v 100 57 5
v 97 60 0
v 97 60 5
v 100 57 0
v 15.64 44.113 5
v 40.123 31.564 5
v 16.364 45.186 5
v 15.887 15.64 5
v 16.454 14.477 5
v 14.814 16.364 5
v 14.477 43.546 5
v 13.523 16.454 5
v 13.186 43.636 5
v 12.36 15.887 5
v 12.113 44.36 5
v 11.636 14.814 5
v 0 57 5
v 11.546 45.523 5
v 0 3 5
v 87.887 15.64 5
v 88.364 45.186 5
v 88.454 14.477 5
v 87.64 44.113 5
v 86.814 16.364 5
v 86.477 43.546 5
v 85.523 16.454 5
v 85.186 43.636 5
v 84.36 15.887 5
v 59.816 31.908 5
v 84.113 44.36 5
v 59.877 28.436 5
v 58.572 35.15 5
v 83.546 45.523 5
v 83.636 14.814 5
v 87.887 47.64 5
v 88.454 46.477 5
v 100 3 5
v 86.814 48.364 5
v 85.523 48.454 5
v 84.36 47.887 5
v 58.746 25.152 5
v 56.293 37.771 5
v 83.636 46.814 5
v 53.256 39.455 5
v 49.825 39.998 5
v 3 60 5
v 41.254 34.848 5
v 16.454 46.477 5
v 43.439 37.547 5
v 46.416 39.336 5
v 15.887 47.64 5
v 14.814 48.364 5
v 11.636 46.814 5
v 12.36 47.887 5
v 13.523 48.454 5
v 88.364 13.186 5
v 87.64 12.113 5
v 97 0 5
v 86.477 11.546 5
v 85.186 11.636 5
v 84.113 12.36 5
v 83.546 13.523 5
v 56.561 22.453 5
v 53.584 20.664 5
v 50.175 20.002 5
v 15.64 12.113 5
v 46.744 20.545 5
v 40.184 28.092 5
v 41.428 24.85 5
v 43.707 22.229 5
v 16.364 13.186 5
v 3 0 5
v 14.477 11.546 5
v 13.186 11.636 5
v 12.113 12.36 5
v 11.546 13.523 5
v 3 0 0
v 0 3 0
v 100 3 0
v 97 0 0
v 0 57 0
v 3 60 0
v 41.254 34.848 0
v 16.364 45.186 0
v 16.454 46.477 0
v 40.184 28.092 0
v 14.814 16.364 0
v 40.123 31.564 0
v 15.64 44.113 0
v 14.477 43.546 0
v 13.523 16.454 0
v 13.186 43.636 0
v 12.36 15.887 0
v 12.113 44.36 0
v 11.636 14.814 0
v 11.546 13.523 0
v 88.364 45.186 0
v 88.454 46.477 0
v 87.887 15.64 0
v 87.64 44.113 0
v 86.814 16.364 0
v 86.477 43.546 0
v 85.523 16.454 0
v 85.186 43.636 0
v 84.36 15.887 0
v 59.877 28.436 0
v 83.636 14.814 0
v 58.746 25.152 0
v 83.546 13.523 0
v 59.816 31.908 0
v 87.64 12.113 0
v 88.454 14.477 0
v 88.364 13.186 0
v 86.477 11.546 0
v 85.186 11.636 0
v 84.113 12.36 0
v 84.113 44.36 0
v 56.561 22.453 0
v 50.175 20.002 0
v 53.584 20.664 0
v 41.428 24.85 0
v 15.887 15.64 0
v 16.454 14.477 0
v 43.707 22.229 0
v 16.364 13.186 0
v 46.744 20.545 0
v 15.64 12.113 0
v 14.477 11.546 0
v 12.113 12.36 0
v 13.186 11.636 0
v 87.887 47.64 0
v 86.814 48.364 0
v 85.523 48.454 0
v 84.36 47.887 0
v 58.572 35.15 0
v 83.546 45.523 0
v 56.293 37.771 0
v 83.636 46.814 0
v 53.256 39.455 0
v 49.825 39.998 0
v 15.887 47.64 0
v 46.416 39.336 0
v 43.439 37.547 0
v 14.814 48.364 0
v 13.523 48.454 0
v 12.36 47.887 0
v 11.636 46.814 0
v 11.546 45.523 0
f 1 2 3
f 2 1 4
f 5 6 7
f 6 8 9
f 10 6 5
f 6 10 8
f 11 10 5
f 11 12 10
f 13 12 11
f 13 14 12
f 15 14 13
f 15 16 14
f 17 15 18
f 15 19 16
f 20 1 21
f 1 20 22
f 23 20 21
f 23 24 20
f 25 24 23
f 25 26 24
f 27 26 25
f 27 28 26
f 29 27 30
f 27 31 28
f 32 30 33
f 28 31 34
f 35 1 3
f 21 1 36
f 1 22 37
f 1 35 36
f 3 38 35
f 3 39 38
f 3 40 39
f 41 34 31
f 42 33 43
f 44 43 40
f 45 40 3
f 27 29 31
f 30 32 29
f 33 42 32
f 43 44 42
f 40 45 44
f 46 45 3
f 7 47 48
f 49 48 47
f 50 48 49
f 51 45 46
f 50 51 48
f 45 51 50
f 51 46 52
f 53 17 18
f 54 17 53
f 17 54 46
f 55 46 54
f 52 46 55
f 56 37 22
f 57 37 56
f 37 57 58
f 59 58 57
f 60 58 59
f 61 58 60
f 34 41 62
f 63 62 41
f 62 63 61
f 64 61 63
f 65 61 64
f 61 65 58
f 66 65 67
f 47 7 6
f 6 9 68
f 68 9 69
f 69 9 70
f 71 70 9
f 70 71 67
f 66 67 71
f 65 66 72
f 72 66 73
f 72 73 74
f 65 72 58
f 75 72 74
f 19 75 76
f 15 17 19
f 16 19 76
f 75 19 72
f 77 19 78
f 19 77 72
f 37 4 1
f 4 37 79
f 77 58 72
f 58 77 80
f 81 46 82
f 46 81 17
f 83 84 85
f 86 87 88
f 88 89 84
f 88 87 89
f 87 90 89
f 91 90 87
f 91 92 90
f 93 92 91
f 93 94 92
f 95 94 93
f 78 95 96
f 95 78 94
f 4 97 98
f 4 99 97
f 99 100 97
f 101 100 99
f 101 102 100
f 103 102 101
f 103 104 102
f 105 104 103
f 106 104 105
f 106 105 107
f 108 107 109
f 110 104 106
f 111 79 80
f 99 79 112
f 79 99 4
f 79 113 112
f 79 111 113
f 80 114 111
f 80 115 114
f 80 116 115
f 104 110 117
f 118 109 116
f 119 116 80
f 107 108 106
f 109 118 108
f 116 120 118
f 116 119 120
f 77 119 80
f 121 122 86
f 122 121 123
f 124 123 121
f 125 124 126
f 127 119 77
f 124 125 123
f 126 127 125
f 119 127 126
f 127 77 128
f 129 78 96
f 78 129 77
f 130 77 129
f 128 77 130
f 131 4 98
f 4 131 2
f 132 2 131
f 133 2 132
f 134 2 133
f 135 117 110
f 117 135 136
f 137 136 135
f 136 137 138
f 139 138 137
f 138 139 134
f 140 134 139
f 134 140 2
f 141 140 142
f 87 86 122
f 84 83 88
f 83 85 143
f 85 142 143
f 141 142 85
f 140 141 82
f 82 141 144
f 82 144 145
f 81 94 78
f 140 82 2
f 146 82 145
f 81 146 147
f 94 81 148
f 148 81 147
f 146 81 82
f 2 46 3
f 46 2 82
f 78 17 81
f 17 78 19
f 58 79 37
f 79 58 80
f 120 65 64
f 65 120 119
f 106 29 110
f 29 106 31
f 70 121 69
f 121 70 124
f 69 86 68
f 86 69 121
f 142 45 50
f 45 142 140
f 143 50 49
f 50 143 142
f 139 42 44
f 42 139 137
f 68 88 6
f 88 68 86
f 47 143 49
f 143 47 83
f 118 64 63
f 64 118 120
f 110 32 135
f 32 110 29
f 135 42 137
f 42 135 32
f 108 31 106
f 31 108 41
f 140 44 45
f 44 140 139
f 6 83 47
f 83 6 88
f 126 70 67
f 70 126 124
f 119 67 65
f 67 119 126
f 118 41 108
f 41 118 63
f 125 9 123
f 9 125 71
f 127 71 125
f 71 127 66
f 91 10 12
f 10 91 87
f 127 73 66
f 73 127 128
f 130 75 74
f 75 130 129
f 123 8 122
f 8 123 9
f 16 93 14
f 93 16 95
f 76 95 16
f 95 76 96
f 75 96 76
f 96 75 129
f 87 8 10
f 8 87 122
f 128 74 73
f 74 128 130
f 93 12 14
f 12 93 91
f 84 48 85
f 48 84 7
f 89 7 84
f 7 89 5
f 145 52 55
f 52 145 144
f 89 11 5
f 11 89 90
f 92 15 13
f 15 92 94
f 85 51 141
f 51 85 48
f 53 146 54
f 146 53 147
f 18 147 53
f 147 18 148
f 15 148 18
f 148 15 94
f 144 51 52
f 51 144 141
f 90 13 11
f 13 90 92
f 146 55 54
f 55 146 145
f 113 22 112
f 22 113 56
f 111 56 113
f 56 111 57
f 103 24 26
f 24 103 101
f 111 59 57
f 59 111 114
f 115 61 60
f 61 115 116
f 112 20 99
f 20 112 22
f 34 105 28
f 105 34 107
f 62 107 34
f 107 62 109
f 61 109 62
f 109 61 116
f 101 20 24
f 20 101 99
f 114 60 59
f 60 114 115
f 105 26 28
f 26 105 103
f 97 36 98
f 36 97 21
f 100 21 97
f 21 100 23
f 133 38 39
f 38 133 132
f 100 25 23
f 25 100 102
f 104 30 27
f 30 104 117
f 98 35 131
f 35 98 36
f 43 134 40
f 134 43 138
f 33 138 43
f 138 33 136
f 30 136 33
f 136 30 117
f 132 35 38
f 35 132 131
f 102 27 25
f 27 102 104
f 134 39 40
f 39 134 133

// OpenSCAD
$fn = 32;

// ----------------------------------------------------------------------
// Spacer plate: rect 100 x 60
// ----------------------------------------------------------------------

// --- parameters (mm) ---
bore_r = 10;              // centre bore radius
bolt_r = 2.5;             // bolt hole radius
plate_t = 5;              // plate thickness, Z (extrusion height)
plate_l = 100;            // plate length, X
plate_w = 60;             // plate width, Y
inset = 14;               // corner hole inset

profile = [[3, 0], [97, 0], [100, 3], [100, 57], [97, 60], [3, 60], [0, 57], [0, 3]];  // primary outline, 8 points, counter clockwise
void_1 = [[59.816, 31.908], [58.572, 35.15], [56.293, 37.771], [53.256, 39.455], [49.825, 39.998], [46.416, 39.336], [43.439, 37.547], [41.254, 34.848], [40.123, 31.564], [40.184, 28.092], [41.428, 24.85], [43.707, 22.229], [46.744, 20.545], [50.175, 20.002], [53.584, 20.664], [56.561, 22.453], [58.746, 25.152], [59.877, 28.436]];  // centre bore, 18 points
void_2 = [[16.454, 14.477], [15.887, 15.64], [14.814, 16.364], [13.523, 16.454], [12.36, 15.887], [11.636, 14.814], [11.546, 13.523], [12.113, 12.36], [13.186, 11.636], [14.477, 11.546], [15.64, 12.113], [16.364, 13.186]];  // corner hole, 12 points
void_3 = [[16.454, 46.477], [15.887, 47.64], [14.814, 48.364], [13.523, 48.454], [12.36, 47.887], [11.636, 46.814], [11.546, 45.523], [12.113, 44.36], [13.186, 43.636], [14.477, 43.546], [15.64, 44.113], [16.364, 45.186]];  // corner hole, 12 points
void_4 = [[88.454, 14.477], [87.887, 15.64], [86.814, 16.364], [85.523, 16.454], [84.36, 15.887], [83.636, 14.814], [83.546, 13.523], [84.113, 12.36], [85.186, 11.636], [86.477, 11.546], [87.64, 12.113], [88.364, 13.186]];  // corner hole, 12 points
void_5 = [[88.454, 46.477], [87.887, 47.64], [86.814, 48.364], [85.523, 48.454], [84.36, 47.887], [83.636, 46.814], [83.546, 45.523], [84.113, 44.36], [85.186, 43.636], [86.477, 43.546], [87.64, 44.113], [88.364, 45.186]];  // corner hole, 12 points

// --- the one profile operation ---
difference() {
  linear_extrude(height = plate_t) polygon(points = profile);
  translate([0, 0, -1])
    linear_extrude(height = plate_t + 2) polygon(points = void_1);
  translate([0, 0, -1])
    linear_extrude(height = plate_t + 2) polygon(points = void_2);
  translate([0, 0, -1])
    linear_extrude(height = plate_t + 2) polygon(points = void_3);
  translate([0, 0, -1])
    linear_extrude(height = plate_t + 2) polygon(points = void_4);
  translate([0, 0, -1])
    linear_extrude(height = plate_t + 2) polygon(points = void_5);
}
